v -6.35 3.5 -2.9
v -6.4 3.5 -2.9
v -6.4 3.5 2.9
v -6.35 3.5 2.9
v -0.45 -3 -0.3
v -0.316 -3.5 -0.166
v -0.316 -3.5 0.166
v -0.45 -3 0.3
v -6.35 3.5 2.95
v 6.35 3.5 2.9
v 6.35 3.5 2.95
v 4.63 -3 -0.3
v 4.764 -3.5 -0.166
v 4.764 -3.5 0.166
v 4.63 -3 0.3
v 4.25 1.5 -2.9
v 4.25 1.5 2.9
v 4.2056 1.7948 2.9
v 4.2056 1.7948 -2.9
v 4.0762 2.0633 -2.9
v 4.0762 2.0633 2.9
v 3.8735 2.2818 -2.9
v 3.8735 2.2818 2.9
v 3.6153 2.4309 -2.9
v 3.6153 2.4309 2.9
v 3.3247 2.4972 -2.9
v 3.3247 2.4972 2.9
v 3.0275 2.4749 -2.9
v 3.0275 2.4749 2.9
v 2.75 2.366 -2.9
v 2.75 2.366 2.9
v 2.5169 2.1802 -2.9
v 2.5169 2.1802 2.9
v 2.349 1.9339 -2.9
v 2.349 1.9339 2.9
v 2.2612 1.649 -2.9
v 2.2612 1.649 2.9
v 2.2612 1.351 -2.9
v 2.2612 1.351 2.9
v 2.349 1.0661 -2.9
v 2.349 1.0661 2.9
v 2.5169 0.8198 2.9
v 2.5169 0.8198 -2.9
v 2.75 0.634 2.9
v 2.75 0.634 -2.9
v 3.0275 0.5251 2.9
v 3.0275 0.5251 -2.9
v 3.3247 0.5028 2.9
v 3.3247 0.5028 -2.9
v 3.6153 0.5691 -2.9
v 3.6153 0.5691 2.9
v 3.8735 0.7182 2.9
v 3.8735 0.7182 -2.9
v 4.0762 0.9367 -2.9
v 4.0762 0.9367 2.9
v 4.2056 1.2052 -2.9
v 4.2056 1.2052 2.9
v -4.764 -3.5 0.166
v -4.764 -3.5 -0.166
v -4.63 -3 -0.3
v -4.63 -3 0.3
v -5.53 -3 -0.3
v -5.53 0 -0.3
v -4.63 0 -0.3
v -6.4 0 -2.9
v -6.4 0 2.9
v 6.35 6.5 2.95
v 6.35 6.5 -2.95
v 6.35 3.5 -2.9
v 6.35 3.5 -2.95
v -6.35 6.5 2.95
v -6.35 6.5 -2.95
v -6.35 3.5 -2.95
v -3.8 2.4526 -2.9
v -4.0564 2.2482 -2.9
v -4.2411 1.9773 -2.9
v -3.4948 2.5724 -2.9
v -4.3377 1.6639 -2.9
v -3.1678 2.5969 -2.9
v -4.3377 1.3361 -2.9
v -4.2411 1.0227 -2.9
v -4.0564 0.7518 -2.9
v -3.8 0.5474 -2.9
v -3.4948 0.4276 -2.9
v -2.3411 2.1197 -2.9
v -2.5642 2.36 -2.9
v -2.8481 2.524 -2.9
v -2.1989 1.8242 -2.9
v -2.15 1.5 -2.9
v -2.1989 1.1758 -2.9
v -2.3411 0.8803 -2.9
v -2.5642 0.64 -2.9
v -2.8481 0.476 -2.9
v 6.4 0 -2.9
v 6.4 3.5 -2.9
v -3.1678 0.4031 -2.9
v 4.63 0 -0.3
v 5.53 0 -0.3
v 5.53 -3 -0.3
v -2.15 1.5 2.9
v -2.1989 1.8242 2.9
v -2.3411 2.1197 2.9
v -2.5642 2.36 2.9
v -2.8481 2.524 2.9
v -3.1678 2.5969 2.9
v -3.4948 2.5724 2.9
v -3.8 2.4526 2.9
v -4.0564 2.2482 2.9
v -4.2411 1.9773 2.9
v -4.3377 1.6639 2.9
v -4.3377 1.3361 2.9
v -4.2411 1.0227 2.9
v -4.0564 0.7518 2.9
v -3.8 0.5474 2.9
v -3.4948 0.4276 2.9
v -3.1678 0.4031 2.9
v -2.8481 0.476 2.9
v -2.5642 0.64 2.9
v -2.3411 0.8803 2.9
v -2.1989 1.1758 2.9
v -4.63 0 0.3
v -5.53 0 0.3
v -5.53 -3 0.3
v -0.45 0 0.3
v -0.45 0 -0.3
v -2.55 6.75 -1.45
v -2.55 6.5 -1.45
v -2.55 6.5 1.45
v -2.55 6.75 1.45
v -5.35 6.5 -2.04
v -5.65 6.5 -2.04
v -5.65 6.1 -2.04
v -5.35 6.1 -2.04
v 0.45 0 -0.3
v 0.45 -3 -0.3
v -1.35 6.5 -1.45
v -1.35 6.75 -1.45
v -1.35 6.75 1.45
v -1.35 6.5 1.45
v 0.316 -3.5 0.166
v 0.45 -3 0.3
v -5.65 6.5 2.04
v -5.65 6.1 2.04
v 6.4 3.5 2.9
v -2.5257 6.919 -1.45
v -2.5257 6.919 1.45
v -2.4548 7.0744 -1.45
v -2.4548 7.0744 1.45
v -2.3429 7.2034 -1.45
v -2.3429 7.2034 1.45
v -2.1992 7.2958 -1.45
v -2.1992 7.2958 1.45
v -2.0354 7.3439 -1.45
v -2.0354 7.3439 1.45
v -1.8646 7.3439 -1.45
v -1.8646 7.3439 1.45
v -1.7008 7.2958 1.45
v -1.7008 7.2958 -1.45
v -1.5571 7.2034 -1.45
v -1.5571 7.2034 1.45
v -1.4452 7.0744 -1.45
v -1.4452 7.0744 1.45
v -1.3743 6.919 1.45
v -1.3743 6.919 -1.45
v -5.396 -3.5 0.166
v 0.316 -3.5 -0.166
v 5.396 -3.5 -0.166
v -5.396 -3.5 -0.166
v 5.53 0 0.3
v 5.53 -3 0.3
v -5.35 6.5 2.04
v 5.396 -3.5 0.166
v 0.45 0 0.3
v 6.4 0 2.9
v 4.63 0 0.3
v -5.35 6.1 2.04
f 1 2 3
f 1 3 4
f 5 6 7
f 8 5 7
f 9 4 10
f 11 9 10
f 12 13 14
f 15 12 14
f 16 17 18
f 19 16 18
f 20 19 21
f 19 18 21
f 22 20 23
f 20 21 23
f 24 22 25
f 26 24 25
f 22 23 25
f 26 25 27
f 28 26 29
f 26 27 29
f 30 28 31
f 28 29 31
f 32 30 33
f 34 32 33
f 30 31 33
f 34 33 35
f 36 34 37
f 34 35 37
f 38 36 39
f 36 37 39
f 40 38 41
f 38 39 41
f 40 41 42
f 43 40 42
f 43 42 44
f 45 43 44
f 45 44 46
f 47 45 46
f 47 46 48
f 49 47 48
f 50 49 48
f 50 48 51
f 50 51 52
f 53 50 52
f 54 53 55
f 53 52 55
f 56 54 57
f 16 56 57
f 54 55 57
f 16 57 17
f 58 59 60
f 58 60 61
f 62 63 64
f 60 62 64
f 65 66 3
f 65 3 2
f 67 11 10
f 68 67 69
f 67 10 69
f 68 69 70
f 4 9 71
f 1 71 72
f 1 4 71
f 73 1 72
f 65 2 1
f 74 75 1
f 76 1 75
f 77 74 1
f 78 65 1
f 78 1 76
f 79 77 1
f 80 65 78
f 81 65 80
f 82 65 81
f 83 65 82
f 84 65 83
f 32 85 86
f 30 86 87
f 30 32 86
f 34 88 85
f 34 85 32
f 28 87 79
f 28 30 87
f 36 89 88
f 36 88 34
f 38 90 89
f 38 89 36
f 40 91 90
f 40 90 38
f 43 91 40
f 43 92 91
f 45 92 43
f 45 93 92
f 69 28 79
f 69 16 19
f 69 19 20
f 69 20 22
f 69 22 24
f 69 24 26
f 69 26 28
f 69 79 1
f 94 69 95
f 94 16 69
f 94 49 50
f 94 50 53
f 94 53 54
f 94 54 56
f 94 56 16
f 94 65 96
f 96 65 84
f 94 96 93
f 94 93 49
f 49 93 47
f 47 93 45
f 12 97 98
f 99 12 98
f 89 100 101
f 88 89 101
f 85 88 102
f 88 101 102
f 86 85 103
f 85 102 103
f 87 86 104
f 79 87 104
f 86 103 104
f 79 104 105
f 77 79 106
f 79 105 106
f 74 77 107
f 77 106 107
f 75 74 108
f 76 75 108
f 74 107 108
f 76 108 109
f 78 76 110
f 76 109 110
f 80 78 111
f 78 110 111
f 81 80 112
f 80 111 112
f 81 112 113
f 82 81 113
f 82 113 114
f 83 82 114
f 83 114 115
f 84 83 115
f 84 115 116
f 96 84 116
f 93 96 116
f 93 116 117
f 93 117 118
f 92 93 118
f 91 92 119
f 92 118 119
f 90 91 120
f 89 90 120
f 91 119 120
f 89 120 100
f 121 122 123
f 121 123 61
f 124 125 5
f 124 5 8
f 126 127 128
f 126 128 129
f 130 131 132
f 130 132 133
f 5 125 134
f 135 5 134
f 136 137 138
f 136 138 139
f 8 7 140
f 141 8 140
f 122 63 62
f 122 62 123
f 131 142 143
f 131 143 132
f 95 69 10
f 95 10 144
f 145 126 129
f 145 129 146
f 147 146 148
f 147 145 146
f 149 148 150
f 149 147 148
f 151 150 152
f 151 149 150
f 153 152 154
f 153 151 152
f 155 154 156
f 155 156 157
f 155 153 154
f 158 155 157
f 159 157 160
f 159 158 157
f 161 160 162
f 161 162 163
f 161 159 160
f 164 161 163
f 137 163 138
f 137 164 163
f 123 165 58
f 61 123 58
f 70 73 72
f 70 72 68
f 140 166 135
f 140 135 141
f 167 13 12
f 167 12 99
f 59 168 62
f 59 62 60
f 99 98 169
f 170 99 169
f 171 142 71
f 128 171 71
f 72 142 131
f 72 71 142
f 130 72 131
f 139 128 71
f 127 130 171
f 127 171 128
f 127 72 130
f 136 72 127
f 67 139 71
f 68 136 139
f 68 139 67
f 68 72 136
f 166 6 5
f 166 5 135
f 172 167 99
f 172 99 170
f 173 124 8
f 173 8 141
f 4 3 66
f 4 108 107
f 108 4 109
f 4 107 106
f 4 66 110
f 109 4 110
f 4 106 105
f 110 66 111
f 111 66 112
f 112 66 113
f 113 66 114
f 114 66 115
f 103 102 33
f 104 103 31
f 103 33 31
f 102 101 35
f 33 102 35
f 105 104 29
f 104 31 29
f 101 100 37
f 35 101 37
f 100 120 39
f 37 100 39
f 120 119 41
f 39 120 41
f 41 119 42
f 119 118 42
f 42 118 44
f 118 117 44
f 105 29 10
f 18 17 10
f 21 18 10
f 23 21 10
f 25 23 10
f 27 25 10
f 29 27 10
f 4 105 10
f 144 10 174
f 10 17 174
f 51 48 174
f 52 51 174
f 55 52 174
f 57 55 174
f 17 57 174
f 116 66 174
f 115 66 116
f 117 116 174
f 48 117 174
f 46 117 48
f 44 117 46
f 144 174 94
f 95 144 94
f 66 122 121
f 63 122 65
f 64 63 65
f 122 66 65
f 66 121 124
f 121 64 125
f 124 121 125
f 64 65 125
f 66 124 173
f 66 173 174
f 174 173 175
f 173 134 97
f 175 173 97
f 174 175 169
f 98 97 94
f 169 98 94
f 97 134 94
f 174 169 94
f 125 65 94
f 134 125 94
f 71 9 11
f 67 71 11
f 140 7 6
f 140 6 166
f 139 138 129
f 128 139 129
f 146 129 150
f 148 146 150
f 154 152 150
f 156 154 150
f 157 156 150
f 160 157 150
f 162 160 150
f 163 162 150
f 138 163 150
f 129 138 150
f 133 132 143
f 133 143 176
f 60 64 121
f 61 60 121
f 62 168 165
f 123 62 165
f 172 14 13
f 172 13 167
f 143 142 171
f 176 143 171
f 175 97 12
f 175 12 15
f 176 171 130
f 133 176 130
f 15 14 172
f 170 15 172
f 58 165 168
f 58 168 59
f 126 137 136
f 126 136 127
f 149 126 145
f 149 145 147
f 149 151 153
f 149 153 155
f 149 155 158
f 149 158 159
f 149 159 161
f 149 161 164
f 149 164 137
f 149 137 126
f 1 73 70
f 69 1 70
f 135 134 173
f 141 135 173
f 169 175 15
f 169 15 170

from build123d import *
from OCP.BRepFilletAPI import BRepFilletAPI_MakeChamfer

# Parameters (mm, degrees)
SKETCH1_W                = 12.8
SKETCH1_H                = 5.8
BOSS_EXTRUDE1_DEPTH      = 3.5
SKETCH2_W                = 0.9
SKETCH2_H                = 0.6
BOSS_EXTRUDE3_DEPTH      = 3.5
CHAMFER1_SIZE            = 0.5
CHAMFER1_SIZE2           = 0.133974596
SKETCH3_R                = 1.1
SKETCH3_R_2              = 1
CUT_EXTRUDE1_DEPTH       = 5.8
SKETCH4_W                = 12.7
SKETCH4_H                = 5.9
BOSS_EXTRUDE4_DEPTH      = 3
BOSS_EXTRUDE5_DEPTH      = 1.45
BOSS_EXTRUDE5_DEPTH_BACK = 1.45
SKETCH6_W                = 0.3
SKETCH6_H                = 4.08
CUT_EXTRUDE2_DEPTH       = 0.4


with BuildPart() as part:
    # Sketch1 → Boss-Extrude1 (new body)
    with BuildSketch(Plane(origin=(0, 0, 0), x_dir=(1, 0, 0), z_dir=(0, 1, 0))):
        Rectangle(SKETCH1_W, SKETCH1_H)
    extrude(amount=BOSS_EXTRUDE1_DEPTH)

    # Sketch2 → Boss-Extrude3 (add)
    with BuildSketch(Plane.XZ):
        Rectangle(SKETCH2_W, SKETCH2_H)
        with Locations((-5.08, 0)):
            Rectangle(SKETCH2_W, SKETCH2_H)
        with Locations((5.08, 0)):
            Rectangle(SKETCH2_W, SKETCH2_H)
    extrude(amount=BOSS_EXTRUDE3_DEPTH)

    # Chamfer1: one chamfer whose edges measure the first distance from different faces: ONE call of the kernel's chamfer builder (chamfer() names one face for all edges)
    chamfer1_edges_1 = [part.edges().sort_by_distance(p)[0] for p in [
        (0.45, -3.5, 0),
    ]]
    chamfer1_side_1 = [part.faces().sort_by_distance(p)[0] for p in [
        (0.45, -1.75, 0),
    ]]
    chamfer1_edges_2 = [part.edges().sort_by_distance(p)[0] for p in [
        (0, -3.5, 0.3),
    ]]
    chamfer1_side_2 = [part.faces().sort_by_distance(p)[0] for p in [
        (0, -1.75, 0.3),
    ]]
    chamfer1_edges_3 = [part.edges().sort_by_distance(p)[0] for p in [
        (-0.45, -3.5, 0),
    ]]
    chamfer1_side_3 = [part.faces().sort_by_distance(p)[0] for p in [
        (-0.45, -1.75, 0),
    ]]
    chamfer1_edges_4 = [part.edges().sort_by_distance(p)[0] for p in [
        (0, -3.5, -0.3),
    ]]
    chamfer1_side_4 = [part.faces().sort_by_distance(p)[0] for p in [
        (0, -1.75, -0.3),
    ]]
    chamfer1_edges_5 = [part.edges().sort_by_distance(p)[0] for p in [
        (-4.63, -3.5, 0),
    ]]
    chamfer1_side_5 = [part.faces().sort_by_distance(p)[0] for p in [
        (-4.63, -1.75, 0),
    ]]
    chamfer1_edges_6 = [part.edges().sort_by_distance(p)[0] for p in [
        (-5.08, -3.5, 0.3),
    ]]
    chamfer1_side_6 = [part.faces().sort_by_distance(p)[0] for p in [
        (-5.08, -1.75, 0.3),
    ]]
    chamfer1_edges_7 = [part.edges().sort_by_distance(p)[0] for p in [
        (-5.53, -3.5, 0),
    ]]
    chamfer1_side_7 = [part.faces().sort_by_distance(p)[0] for p in [
        (-5.53, -1.75, 0),
    ]]
    chamfer1_edges_8 = [part.edges().sort_by_distance(p)[0] for p in [
        (-5.08, -3.5, -0.3),
    ]]
    chamfer1_side_8 = [part.faces().sort_by_distance(p)[0] for p in [
        (-5.08, -1.75, -0.3),
    ]]
    chamfer1_edges_9 = [part.edges().sort_by_distance(p)[0] for p in [
        (5.53, -3.5, 0),
    ]]
    chamfer1_side_9 = [part.faces().sort_by_distance(p)[0] for p in [
        (5.53, -1.75, 0),
    ]]
    chamfer1_edges_10 = [part.edges().sort_by_distance(p)[0] for p in [
        (5.08, -3.5, 0.3),
    ]]
    chamfer1_side_10 = [part.faces().sort_by_distance(p)[0] for p in [
        (5.08, -1.75, 0.3),
    ]]
    chamfer1_edges_11 = [part.edges().sort_by_distance(p)[0] for p in [
        (4.63, -3.5, 0),
    ]]
    chamfer1_side_11 = [part.faces().sort_by_distance(p)[0] for p in [
        (4.63, -1.75, 0),
    ]]
    chamfer1_edges_12 = [part.edges().sort_by_distance(p)[0] for p in [
        (5.08, -3.5, -0.3),
    ]]
    chamfer1_side_12 = [part.faces().sort_by_distance(p)[0] for p in [
        (5.08, -1.75, -0.3),
    ]]
    chamfer1 = BRepFilletAPI_MakeChamfer(part.part.solid().wrapped)
    for e in chamfer1_edges_1:
        chamfer1.Add(CHAMFER1_SIZE, CHAMFER1_SIZE2, e.wrapped, chamfer1_side_1[0].wrapped)  # the first distance lies on this face
    for e in chamfer1_edges_2:
        chamfer1.Add(CHAMFER1_SIZE, CHAMFER1_SIZE2, e.wrapped, chamfer1_side_2[0].wrapped)  # the first distance lies on this face
    for e in chamfer1_edges_3:
        chamfer1.Add(CHAMFER1_SIZE, CHAMFER1_SIZE2, e.wrapped, chamfer1_side_3[0].wrapped)  # the first distance lies on this face
    for e in chamfer1_edges_4:
        chamfer1.Add(CHAMFER1_SIZE, CHAMFER1_SIZE2, e.wrapped, chamfer1_side_4[0].wrapped)  # the first distance lies on this face
    for e in chamfer1_edges_5:
        chamfer1.Add(CHAMFER1_SIZE, CHAMFER1_SIZE2, e.wrapped, chamfer1_side_5[0].wrapped)  # the first distance lies on this face
    for e in chamfer1_edges_6:
        chamfer1.Add(CHAMFER1_SIZE, CHAMFER1_SIZE2, e.wrapped, chamfer1_side_6[0].wrapped)  # the first distance lies on this face
    for e in chamfer1_edges_7:
        chamfer1.Add(CHAMFER1_SIZE, CHAMFER1_SIZE2, e.wrapped, chamfer1_side_7[0].wrapped)  # the first distance lies on this face
    for e in chamfer1_edges_8:
        chamfer1.Add(CHAMFER1_SIZE, CHAMFER1_SIZE2, e.wrapped, chamfer1_side_8[0].wrapped)  # the first distance lies on this face
    for e in chamfer1_edges_9:
        chamfer1.Add(CHAMFER1_SIZE, CHAMFER1_SIZE2, e.wrapped, chamfer1_side_9[0].wrapped)  # the first distance lies on this face
    for e in chamfer1_edges_10:
        chamfer1.Add(CHAMFER1_SIZE, CHAMFER1_SIZE2, e.wrapped, chamfer1_side_10[0].wrapped)  # the first distance lies on this face
    for e in chamfer1_edges_11:
        chamfer1.Add(CHAMFER1_SIZE, CHAMFER1_SIZE2, e.wrapped, chamfer1_side_11[0].wrapped)  # the first distance lies on this face
    for e in chamfer1_edges_12:
        chamfer1.Add(CHAMFER1_SIZE, CHAMFER1_SIZE2, e.wrapped, chamfer1_side_12[0].wrapped)  # the first distance lies on this face
    add(Compound.cast(chamfer1.Shape()), mode=Mode.REPLACE)

    # Sketch3 → Cut-Extrude1 (cut)
    with BuildSketch(Plane.XY.offset(2.9)):
        with Locations((-3.25, 1.5)):
            Circle(SKETCH3_R)
        with Locations((3.25, 1.5)):
            Circle(SKETCH3_R_2)
    extrude(amount=-CUT_EXTRUDE1_DEPTH, mode=Mode.SUBTRACT)

    # Sketch4 → Boss-Extrude4 (add)
    with BuildSketch(Plane(origin=(0, 3.5, 0), x_dir=(1, 0, 0), z_dir=(0, 1, 0))):
        Rectangle(SKETCH4_W, SKETCH4_H)
    extrude(amount=BOSS_EXTRUDE4_DEPTH)

    # Sketch5 → Boss-Extrude5 (add, two sides: drawn at the far end of the back side and taken through both)
    with BuildSketch(Plane.XY.offset(-BOSS_EXTRUDE5_DEPTH_BACK)):
        with BuildLine():
            Line((-2.55, 6.5), (-2.55, 6.75))
            ThreePointArc((-2.55, 6.75), (-1.95, 7.35), (-1.35, 6.75))
            Line((-1.35, 6.75), (-1.35, 6.5))
            Line((-1.35, 6.5), (-2.55, 6.5))
        make_face()
    extrude(amount=BOSS_EXTRUDE5_DEPTH + BOSS_EXTRUDE5_DEPTH_BACK)

    # Sketch6 → Cut-Extrude2 (cut)
    with BuildSketch(Plane(origin=(0, 6.5, 0), x_dir=(1, 0, 0), z_dir=(0, 1, 0))):
        with Locations((-5.5, 0)):
            Rectangle(SKETCH6_W, SKETCH6_H)
    extrude(amount=-CUT_EXTRUDE2_DEPTH, mode=Mode.SUBTRACT)


solid = part.part
